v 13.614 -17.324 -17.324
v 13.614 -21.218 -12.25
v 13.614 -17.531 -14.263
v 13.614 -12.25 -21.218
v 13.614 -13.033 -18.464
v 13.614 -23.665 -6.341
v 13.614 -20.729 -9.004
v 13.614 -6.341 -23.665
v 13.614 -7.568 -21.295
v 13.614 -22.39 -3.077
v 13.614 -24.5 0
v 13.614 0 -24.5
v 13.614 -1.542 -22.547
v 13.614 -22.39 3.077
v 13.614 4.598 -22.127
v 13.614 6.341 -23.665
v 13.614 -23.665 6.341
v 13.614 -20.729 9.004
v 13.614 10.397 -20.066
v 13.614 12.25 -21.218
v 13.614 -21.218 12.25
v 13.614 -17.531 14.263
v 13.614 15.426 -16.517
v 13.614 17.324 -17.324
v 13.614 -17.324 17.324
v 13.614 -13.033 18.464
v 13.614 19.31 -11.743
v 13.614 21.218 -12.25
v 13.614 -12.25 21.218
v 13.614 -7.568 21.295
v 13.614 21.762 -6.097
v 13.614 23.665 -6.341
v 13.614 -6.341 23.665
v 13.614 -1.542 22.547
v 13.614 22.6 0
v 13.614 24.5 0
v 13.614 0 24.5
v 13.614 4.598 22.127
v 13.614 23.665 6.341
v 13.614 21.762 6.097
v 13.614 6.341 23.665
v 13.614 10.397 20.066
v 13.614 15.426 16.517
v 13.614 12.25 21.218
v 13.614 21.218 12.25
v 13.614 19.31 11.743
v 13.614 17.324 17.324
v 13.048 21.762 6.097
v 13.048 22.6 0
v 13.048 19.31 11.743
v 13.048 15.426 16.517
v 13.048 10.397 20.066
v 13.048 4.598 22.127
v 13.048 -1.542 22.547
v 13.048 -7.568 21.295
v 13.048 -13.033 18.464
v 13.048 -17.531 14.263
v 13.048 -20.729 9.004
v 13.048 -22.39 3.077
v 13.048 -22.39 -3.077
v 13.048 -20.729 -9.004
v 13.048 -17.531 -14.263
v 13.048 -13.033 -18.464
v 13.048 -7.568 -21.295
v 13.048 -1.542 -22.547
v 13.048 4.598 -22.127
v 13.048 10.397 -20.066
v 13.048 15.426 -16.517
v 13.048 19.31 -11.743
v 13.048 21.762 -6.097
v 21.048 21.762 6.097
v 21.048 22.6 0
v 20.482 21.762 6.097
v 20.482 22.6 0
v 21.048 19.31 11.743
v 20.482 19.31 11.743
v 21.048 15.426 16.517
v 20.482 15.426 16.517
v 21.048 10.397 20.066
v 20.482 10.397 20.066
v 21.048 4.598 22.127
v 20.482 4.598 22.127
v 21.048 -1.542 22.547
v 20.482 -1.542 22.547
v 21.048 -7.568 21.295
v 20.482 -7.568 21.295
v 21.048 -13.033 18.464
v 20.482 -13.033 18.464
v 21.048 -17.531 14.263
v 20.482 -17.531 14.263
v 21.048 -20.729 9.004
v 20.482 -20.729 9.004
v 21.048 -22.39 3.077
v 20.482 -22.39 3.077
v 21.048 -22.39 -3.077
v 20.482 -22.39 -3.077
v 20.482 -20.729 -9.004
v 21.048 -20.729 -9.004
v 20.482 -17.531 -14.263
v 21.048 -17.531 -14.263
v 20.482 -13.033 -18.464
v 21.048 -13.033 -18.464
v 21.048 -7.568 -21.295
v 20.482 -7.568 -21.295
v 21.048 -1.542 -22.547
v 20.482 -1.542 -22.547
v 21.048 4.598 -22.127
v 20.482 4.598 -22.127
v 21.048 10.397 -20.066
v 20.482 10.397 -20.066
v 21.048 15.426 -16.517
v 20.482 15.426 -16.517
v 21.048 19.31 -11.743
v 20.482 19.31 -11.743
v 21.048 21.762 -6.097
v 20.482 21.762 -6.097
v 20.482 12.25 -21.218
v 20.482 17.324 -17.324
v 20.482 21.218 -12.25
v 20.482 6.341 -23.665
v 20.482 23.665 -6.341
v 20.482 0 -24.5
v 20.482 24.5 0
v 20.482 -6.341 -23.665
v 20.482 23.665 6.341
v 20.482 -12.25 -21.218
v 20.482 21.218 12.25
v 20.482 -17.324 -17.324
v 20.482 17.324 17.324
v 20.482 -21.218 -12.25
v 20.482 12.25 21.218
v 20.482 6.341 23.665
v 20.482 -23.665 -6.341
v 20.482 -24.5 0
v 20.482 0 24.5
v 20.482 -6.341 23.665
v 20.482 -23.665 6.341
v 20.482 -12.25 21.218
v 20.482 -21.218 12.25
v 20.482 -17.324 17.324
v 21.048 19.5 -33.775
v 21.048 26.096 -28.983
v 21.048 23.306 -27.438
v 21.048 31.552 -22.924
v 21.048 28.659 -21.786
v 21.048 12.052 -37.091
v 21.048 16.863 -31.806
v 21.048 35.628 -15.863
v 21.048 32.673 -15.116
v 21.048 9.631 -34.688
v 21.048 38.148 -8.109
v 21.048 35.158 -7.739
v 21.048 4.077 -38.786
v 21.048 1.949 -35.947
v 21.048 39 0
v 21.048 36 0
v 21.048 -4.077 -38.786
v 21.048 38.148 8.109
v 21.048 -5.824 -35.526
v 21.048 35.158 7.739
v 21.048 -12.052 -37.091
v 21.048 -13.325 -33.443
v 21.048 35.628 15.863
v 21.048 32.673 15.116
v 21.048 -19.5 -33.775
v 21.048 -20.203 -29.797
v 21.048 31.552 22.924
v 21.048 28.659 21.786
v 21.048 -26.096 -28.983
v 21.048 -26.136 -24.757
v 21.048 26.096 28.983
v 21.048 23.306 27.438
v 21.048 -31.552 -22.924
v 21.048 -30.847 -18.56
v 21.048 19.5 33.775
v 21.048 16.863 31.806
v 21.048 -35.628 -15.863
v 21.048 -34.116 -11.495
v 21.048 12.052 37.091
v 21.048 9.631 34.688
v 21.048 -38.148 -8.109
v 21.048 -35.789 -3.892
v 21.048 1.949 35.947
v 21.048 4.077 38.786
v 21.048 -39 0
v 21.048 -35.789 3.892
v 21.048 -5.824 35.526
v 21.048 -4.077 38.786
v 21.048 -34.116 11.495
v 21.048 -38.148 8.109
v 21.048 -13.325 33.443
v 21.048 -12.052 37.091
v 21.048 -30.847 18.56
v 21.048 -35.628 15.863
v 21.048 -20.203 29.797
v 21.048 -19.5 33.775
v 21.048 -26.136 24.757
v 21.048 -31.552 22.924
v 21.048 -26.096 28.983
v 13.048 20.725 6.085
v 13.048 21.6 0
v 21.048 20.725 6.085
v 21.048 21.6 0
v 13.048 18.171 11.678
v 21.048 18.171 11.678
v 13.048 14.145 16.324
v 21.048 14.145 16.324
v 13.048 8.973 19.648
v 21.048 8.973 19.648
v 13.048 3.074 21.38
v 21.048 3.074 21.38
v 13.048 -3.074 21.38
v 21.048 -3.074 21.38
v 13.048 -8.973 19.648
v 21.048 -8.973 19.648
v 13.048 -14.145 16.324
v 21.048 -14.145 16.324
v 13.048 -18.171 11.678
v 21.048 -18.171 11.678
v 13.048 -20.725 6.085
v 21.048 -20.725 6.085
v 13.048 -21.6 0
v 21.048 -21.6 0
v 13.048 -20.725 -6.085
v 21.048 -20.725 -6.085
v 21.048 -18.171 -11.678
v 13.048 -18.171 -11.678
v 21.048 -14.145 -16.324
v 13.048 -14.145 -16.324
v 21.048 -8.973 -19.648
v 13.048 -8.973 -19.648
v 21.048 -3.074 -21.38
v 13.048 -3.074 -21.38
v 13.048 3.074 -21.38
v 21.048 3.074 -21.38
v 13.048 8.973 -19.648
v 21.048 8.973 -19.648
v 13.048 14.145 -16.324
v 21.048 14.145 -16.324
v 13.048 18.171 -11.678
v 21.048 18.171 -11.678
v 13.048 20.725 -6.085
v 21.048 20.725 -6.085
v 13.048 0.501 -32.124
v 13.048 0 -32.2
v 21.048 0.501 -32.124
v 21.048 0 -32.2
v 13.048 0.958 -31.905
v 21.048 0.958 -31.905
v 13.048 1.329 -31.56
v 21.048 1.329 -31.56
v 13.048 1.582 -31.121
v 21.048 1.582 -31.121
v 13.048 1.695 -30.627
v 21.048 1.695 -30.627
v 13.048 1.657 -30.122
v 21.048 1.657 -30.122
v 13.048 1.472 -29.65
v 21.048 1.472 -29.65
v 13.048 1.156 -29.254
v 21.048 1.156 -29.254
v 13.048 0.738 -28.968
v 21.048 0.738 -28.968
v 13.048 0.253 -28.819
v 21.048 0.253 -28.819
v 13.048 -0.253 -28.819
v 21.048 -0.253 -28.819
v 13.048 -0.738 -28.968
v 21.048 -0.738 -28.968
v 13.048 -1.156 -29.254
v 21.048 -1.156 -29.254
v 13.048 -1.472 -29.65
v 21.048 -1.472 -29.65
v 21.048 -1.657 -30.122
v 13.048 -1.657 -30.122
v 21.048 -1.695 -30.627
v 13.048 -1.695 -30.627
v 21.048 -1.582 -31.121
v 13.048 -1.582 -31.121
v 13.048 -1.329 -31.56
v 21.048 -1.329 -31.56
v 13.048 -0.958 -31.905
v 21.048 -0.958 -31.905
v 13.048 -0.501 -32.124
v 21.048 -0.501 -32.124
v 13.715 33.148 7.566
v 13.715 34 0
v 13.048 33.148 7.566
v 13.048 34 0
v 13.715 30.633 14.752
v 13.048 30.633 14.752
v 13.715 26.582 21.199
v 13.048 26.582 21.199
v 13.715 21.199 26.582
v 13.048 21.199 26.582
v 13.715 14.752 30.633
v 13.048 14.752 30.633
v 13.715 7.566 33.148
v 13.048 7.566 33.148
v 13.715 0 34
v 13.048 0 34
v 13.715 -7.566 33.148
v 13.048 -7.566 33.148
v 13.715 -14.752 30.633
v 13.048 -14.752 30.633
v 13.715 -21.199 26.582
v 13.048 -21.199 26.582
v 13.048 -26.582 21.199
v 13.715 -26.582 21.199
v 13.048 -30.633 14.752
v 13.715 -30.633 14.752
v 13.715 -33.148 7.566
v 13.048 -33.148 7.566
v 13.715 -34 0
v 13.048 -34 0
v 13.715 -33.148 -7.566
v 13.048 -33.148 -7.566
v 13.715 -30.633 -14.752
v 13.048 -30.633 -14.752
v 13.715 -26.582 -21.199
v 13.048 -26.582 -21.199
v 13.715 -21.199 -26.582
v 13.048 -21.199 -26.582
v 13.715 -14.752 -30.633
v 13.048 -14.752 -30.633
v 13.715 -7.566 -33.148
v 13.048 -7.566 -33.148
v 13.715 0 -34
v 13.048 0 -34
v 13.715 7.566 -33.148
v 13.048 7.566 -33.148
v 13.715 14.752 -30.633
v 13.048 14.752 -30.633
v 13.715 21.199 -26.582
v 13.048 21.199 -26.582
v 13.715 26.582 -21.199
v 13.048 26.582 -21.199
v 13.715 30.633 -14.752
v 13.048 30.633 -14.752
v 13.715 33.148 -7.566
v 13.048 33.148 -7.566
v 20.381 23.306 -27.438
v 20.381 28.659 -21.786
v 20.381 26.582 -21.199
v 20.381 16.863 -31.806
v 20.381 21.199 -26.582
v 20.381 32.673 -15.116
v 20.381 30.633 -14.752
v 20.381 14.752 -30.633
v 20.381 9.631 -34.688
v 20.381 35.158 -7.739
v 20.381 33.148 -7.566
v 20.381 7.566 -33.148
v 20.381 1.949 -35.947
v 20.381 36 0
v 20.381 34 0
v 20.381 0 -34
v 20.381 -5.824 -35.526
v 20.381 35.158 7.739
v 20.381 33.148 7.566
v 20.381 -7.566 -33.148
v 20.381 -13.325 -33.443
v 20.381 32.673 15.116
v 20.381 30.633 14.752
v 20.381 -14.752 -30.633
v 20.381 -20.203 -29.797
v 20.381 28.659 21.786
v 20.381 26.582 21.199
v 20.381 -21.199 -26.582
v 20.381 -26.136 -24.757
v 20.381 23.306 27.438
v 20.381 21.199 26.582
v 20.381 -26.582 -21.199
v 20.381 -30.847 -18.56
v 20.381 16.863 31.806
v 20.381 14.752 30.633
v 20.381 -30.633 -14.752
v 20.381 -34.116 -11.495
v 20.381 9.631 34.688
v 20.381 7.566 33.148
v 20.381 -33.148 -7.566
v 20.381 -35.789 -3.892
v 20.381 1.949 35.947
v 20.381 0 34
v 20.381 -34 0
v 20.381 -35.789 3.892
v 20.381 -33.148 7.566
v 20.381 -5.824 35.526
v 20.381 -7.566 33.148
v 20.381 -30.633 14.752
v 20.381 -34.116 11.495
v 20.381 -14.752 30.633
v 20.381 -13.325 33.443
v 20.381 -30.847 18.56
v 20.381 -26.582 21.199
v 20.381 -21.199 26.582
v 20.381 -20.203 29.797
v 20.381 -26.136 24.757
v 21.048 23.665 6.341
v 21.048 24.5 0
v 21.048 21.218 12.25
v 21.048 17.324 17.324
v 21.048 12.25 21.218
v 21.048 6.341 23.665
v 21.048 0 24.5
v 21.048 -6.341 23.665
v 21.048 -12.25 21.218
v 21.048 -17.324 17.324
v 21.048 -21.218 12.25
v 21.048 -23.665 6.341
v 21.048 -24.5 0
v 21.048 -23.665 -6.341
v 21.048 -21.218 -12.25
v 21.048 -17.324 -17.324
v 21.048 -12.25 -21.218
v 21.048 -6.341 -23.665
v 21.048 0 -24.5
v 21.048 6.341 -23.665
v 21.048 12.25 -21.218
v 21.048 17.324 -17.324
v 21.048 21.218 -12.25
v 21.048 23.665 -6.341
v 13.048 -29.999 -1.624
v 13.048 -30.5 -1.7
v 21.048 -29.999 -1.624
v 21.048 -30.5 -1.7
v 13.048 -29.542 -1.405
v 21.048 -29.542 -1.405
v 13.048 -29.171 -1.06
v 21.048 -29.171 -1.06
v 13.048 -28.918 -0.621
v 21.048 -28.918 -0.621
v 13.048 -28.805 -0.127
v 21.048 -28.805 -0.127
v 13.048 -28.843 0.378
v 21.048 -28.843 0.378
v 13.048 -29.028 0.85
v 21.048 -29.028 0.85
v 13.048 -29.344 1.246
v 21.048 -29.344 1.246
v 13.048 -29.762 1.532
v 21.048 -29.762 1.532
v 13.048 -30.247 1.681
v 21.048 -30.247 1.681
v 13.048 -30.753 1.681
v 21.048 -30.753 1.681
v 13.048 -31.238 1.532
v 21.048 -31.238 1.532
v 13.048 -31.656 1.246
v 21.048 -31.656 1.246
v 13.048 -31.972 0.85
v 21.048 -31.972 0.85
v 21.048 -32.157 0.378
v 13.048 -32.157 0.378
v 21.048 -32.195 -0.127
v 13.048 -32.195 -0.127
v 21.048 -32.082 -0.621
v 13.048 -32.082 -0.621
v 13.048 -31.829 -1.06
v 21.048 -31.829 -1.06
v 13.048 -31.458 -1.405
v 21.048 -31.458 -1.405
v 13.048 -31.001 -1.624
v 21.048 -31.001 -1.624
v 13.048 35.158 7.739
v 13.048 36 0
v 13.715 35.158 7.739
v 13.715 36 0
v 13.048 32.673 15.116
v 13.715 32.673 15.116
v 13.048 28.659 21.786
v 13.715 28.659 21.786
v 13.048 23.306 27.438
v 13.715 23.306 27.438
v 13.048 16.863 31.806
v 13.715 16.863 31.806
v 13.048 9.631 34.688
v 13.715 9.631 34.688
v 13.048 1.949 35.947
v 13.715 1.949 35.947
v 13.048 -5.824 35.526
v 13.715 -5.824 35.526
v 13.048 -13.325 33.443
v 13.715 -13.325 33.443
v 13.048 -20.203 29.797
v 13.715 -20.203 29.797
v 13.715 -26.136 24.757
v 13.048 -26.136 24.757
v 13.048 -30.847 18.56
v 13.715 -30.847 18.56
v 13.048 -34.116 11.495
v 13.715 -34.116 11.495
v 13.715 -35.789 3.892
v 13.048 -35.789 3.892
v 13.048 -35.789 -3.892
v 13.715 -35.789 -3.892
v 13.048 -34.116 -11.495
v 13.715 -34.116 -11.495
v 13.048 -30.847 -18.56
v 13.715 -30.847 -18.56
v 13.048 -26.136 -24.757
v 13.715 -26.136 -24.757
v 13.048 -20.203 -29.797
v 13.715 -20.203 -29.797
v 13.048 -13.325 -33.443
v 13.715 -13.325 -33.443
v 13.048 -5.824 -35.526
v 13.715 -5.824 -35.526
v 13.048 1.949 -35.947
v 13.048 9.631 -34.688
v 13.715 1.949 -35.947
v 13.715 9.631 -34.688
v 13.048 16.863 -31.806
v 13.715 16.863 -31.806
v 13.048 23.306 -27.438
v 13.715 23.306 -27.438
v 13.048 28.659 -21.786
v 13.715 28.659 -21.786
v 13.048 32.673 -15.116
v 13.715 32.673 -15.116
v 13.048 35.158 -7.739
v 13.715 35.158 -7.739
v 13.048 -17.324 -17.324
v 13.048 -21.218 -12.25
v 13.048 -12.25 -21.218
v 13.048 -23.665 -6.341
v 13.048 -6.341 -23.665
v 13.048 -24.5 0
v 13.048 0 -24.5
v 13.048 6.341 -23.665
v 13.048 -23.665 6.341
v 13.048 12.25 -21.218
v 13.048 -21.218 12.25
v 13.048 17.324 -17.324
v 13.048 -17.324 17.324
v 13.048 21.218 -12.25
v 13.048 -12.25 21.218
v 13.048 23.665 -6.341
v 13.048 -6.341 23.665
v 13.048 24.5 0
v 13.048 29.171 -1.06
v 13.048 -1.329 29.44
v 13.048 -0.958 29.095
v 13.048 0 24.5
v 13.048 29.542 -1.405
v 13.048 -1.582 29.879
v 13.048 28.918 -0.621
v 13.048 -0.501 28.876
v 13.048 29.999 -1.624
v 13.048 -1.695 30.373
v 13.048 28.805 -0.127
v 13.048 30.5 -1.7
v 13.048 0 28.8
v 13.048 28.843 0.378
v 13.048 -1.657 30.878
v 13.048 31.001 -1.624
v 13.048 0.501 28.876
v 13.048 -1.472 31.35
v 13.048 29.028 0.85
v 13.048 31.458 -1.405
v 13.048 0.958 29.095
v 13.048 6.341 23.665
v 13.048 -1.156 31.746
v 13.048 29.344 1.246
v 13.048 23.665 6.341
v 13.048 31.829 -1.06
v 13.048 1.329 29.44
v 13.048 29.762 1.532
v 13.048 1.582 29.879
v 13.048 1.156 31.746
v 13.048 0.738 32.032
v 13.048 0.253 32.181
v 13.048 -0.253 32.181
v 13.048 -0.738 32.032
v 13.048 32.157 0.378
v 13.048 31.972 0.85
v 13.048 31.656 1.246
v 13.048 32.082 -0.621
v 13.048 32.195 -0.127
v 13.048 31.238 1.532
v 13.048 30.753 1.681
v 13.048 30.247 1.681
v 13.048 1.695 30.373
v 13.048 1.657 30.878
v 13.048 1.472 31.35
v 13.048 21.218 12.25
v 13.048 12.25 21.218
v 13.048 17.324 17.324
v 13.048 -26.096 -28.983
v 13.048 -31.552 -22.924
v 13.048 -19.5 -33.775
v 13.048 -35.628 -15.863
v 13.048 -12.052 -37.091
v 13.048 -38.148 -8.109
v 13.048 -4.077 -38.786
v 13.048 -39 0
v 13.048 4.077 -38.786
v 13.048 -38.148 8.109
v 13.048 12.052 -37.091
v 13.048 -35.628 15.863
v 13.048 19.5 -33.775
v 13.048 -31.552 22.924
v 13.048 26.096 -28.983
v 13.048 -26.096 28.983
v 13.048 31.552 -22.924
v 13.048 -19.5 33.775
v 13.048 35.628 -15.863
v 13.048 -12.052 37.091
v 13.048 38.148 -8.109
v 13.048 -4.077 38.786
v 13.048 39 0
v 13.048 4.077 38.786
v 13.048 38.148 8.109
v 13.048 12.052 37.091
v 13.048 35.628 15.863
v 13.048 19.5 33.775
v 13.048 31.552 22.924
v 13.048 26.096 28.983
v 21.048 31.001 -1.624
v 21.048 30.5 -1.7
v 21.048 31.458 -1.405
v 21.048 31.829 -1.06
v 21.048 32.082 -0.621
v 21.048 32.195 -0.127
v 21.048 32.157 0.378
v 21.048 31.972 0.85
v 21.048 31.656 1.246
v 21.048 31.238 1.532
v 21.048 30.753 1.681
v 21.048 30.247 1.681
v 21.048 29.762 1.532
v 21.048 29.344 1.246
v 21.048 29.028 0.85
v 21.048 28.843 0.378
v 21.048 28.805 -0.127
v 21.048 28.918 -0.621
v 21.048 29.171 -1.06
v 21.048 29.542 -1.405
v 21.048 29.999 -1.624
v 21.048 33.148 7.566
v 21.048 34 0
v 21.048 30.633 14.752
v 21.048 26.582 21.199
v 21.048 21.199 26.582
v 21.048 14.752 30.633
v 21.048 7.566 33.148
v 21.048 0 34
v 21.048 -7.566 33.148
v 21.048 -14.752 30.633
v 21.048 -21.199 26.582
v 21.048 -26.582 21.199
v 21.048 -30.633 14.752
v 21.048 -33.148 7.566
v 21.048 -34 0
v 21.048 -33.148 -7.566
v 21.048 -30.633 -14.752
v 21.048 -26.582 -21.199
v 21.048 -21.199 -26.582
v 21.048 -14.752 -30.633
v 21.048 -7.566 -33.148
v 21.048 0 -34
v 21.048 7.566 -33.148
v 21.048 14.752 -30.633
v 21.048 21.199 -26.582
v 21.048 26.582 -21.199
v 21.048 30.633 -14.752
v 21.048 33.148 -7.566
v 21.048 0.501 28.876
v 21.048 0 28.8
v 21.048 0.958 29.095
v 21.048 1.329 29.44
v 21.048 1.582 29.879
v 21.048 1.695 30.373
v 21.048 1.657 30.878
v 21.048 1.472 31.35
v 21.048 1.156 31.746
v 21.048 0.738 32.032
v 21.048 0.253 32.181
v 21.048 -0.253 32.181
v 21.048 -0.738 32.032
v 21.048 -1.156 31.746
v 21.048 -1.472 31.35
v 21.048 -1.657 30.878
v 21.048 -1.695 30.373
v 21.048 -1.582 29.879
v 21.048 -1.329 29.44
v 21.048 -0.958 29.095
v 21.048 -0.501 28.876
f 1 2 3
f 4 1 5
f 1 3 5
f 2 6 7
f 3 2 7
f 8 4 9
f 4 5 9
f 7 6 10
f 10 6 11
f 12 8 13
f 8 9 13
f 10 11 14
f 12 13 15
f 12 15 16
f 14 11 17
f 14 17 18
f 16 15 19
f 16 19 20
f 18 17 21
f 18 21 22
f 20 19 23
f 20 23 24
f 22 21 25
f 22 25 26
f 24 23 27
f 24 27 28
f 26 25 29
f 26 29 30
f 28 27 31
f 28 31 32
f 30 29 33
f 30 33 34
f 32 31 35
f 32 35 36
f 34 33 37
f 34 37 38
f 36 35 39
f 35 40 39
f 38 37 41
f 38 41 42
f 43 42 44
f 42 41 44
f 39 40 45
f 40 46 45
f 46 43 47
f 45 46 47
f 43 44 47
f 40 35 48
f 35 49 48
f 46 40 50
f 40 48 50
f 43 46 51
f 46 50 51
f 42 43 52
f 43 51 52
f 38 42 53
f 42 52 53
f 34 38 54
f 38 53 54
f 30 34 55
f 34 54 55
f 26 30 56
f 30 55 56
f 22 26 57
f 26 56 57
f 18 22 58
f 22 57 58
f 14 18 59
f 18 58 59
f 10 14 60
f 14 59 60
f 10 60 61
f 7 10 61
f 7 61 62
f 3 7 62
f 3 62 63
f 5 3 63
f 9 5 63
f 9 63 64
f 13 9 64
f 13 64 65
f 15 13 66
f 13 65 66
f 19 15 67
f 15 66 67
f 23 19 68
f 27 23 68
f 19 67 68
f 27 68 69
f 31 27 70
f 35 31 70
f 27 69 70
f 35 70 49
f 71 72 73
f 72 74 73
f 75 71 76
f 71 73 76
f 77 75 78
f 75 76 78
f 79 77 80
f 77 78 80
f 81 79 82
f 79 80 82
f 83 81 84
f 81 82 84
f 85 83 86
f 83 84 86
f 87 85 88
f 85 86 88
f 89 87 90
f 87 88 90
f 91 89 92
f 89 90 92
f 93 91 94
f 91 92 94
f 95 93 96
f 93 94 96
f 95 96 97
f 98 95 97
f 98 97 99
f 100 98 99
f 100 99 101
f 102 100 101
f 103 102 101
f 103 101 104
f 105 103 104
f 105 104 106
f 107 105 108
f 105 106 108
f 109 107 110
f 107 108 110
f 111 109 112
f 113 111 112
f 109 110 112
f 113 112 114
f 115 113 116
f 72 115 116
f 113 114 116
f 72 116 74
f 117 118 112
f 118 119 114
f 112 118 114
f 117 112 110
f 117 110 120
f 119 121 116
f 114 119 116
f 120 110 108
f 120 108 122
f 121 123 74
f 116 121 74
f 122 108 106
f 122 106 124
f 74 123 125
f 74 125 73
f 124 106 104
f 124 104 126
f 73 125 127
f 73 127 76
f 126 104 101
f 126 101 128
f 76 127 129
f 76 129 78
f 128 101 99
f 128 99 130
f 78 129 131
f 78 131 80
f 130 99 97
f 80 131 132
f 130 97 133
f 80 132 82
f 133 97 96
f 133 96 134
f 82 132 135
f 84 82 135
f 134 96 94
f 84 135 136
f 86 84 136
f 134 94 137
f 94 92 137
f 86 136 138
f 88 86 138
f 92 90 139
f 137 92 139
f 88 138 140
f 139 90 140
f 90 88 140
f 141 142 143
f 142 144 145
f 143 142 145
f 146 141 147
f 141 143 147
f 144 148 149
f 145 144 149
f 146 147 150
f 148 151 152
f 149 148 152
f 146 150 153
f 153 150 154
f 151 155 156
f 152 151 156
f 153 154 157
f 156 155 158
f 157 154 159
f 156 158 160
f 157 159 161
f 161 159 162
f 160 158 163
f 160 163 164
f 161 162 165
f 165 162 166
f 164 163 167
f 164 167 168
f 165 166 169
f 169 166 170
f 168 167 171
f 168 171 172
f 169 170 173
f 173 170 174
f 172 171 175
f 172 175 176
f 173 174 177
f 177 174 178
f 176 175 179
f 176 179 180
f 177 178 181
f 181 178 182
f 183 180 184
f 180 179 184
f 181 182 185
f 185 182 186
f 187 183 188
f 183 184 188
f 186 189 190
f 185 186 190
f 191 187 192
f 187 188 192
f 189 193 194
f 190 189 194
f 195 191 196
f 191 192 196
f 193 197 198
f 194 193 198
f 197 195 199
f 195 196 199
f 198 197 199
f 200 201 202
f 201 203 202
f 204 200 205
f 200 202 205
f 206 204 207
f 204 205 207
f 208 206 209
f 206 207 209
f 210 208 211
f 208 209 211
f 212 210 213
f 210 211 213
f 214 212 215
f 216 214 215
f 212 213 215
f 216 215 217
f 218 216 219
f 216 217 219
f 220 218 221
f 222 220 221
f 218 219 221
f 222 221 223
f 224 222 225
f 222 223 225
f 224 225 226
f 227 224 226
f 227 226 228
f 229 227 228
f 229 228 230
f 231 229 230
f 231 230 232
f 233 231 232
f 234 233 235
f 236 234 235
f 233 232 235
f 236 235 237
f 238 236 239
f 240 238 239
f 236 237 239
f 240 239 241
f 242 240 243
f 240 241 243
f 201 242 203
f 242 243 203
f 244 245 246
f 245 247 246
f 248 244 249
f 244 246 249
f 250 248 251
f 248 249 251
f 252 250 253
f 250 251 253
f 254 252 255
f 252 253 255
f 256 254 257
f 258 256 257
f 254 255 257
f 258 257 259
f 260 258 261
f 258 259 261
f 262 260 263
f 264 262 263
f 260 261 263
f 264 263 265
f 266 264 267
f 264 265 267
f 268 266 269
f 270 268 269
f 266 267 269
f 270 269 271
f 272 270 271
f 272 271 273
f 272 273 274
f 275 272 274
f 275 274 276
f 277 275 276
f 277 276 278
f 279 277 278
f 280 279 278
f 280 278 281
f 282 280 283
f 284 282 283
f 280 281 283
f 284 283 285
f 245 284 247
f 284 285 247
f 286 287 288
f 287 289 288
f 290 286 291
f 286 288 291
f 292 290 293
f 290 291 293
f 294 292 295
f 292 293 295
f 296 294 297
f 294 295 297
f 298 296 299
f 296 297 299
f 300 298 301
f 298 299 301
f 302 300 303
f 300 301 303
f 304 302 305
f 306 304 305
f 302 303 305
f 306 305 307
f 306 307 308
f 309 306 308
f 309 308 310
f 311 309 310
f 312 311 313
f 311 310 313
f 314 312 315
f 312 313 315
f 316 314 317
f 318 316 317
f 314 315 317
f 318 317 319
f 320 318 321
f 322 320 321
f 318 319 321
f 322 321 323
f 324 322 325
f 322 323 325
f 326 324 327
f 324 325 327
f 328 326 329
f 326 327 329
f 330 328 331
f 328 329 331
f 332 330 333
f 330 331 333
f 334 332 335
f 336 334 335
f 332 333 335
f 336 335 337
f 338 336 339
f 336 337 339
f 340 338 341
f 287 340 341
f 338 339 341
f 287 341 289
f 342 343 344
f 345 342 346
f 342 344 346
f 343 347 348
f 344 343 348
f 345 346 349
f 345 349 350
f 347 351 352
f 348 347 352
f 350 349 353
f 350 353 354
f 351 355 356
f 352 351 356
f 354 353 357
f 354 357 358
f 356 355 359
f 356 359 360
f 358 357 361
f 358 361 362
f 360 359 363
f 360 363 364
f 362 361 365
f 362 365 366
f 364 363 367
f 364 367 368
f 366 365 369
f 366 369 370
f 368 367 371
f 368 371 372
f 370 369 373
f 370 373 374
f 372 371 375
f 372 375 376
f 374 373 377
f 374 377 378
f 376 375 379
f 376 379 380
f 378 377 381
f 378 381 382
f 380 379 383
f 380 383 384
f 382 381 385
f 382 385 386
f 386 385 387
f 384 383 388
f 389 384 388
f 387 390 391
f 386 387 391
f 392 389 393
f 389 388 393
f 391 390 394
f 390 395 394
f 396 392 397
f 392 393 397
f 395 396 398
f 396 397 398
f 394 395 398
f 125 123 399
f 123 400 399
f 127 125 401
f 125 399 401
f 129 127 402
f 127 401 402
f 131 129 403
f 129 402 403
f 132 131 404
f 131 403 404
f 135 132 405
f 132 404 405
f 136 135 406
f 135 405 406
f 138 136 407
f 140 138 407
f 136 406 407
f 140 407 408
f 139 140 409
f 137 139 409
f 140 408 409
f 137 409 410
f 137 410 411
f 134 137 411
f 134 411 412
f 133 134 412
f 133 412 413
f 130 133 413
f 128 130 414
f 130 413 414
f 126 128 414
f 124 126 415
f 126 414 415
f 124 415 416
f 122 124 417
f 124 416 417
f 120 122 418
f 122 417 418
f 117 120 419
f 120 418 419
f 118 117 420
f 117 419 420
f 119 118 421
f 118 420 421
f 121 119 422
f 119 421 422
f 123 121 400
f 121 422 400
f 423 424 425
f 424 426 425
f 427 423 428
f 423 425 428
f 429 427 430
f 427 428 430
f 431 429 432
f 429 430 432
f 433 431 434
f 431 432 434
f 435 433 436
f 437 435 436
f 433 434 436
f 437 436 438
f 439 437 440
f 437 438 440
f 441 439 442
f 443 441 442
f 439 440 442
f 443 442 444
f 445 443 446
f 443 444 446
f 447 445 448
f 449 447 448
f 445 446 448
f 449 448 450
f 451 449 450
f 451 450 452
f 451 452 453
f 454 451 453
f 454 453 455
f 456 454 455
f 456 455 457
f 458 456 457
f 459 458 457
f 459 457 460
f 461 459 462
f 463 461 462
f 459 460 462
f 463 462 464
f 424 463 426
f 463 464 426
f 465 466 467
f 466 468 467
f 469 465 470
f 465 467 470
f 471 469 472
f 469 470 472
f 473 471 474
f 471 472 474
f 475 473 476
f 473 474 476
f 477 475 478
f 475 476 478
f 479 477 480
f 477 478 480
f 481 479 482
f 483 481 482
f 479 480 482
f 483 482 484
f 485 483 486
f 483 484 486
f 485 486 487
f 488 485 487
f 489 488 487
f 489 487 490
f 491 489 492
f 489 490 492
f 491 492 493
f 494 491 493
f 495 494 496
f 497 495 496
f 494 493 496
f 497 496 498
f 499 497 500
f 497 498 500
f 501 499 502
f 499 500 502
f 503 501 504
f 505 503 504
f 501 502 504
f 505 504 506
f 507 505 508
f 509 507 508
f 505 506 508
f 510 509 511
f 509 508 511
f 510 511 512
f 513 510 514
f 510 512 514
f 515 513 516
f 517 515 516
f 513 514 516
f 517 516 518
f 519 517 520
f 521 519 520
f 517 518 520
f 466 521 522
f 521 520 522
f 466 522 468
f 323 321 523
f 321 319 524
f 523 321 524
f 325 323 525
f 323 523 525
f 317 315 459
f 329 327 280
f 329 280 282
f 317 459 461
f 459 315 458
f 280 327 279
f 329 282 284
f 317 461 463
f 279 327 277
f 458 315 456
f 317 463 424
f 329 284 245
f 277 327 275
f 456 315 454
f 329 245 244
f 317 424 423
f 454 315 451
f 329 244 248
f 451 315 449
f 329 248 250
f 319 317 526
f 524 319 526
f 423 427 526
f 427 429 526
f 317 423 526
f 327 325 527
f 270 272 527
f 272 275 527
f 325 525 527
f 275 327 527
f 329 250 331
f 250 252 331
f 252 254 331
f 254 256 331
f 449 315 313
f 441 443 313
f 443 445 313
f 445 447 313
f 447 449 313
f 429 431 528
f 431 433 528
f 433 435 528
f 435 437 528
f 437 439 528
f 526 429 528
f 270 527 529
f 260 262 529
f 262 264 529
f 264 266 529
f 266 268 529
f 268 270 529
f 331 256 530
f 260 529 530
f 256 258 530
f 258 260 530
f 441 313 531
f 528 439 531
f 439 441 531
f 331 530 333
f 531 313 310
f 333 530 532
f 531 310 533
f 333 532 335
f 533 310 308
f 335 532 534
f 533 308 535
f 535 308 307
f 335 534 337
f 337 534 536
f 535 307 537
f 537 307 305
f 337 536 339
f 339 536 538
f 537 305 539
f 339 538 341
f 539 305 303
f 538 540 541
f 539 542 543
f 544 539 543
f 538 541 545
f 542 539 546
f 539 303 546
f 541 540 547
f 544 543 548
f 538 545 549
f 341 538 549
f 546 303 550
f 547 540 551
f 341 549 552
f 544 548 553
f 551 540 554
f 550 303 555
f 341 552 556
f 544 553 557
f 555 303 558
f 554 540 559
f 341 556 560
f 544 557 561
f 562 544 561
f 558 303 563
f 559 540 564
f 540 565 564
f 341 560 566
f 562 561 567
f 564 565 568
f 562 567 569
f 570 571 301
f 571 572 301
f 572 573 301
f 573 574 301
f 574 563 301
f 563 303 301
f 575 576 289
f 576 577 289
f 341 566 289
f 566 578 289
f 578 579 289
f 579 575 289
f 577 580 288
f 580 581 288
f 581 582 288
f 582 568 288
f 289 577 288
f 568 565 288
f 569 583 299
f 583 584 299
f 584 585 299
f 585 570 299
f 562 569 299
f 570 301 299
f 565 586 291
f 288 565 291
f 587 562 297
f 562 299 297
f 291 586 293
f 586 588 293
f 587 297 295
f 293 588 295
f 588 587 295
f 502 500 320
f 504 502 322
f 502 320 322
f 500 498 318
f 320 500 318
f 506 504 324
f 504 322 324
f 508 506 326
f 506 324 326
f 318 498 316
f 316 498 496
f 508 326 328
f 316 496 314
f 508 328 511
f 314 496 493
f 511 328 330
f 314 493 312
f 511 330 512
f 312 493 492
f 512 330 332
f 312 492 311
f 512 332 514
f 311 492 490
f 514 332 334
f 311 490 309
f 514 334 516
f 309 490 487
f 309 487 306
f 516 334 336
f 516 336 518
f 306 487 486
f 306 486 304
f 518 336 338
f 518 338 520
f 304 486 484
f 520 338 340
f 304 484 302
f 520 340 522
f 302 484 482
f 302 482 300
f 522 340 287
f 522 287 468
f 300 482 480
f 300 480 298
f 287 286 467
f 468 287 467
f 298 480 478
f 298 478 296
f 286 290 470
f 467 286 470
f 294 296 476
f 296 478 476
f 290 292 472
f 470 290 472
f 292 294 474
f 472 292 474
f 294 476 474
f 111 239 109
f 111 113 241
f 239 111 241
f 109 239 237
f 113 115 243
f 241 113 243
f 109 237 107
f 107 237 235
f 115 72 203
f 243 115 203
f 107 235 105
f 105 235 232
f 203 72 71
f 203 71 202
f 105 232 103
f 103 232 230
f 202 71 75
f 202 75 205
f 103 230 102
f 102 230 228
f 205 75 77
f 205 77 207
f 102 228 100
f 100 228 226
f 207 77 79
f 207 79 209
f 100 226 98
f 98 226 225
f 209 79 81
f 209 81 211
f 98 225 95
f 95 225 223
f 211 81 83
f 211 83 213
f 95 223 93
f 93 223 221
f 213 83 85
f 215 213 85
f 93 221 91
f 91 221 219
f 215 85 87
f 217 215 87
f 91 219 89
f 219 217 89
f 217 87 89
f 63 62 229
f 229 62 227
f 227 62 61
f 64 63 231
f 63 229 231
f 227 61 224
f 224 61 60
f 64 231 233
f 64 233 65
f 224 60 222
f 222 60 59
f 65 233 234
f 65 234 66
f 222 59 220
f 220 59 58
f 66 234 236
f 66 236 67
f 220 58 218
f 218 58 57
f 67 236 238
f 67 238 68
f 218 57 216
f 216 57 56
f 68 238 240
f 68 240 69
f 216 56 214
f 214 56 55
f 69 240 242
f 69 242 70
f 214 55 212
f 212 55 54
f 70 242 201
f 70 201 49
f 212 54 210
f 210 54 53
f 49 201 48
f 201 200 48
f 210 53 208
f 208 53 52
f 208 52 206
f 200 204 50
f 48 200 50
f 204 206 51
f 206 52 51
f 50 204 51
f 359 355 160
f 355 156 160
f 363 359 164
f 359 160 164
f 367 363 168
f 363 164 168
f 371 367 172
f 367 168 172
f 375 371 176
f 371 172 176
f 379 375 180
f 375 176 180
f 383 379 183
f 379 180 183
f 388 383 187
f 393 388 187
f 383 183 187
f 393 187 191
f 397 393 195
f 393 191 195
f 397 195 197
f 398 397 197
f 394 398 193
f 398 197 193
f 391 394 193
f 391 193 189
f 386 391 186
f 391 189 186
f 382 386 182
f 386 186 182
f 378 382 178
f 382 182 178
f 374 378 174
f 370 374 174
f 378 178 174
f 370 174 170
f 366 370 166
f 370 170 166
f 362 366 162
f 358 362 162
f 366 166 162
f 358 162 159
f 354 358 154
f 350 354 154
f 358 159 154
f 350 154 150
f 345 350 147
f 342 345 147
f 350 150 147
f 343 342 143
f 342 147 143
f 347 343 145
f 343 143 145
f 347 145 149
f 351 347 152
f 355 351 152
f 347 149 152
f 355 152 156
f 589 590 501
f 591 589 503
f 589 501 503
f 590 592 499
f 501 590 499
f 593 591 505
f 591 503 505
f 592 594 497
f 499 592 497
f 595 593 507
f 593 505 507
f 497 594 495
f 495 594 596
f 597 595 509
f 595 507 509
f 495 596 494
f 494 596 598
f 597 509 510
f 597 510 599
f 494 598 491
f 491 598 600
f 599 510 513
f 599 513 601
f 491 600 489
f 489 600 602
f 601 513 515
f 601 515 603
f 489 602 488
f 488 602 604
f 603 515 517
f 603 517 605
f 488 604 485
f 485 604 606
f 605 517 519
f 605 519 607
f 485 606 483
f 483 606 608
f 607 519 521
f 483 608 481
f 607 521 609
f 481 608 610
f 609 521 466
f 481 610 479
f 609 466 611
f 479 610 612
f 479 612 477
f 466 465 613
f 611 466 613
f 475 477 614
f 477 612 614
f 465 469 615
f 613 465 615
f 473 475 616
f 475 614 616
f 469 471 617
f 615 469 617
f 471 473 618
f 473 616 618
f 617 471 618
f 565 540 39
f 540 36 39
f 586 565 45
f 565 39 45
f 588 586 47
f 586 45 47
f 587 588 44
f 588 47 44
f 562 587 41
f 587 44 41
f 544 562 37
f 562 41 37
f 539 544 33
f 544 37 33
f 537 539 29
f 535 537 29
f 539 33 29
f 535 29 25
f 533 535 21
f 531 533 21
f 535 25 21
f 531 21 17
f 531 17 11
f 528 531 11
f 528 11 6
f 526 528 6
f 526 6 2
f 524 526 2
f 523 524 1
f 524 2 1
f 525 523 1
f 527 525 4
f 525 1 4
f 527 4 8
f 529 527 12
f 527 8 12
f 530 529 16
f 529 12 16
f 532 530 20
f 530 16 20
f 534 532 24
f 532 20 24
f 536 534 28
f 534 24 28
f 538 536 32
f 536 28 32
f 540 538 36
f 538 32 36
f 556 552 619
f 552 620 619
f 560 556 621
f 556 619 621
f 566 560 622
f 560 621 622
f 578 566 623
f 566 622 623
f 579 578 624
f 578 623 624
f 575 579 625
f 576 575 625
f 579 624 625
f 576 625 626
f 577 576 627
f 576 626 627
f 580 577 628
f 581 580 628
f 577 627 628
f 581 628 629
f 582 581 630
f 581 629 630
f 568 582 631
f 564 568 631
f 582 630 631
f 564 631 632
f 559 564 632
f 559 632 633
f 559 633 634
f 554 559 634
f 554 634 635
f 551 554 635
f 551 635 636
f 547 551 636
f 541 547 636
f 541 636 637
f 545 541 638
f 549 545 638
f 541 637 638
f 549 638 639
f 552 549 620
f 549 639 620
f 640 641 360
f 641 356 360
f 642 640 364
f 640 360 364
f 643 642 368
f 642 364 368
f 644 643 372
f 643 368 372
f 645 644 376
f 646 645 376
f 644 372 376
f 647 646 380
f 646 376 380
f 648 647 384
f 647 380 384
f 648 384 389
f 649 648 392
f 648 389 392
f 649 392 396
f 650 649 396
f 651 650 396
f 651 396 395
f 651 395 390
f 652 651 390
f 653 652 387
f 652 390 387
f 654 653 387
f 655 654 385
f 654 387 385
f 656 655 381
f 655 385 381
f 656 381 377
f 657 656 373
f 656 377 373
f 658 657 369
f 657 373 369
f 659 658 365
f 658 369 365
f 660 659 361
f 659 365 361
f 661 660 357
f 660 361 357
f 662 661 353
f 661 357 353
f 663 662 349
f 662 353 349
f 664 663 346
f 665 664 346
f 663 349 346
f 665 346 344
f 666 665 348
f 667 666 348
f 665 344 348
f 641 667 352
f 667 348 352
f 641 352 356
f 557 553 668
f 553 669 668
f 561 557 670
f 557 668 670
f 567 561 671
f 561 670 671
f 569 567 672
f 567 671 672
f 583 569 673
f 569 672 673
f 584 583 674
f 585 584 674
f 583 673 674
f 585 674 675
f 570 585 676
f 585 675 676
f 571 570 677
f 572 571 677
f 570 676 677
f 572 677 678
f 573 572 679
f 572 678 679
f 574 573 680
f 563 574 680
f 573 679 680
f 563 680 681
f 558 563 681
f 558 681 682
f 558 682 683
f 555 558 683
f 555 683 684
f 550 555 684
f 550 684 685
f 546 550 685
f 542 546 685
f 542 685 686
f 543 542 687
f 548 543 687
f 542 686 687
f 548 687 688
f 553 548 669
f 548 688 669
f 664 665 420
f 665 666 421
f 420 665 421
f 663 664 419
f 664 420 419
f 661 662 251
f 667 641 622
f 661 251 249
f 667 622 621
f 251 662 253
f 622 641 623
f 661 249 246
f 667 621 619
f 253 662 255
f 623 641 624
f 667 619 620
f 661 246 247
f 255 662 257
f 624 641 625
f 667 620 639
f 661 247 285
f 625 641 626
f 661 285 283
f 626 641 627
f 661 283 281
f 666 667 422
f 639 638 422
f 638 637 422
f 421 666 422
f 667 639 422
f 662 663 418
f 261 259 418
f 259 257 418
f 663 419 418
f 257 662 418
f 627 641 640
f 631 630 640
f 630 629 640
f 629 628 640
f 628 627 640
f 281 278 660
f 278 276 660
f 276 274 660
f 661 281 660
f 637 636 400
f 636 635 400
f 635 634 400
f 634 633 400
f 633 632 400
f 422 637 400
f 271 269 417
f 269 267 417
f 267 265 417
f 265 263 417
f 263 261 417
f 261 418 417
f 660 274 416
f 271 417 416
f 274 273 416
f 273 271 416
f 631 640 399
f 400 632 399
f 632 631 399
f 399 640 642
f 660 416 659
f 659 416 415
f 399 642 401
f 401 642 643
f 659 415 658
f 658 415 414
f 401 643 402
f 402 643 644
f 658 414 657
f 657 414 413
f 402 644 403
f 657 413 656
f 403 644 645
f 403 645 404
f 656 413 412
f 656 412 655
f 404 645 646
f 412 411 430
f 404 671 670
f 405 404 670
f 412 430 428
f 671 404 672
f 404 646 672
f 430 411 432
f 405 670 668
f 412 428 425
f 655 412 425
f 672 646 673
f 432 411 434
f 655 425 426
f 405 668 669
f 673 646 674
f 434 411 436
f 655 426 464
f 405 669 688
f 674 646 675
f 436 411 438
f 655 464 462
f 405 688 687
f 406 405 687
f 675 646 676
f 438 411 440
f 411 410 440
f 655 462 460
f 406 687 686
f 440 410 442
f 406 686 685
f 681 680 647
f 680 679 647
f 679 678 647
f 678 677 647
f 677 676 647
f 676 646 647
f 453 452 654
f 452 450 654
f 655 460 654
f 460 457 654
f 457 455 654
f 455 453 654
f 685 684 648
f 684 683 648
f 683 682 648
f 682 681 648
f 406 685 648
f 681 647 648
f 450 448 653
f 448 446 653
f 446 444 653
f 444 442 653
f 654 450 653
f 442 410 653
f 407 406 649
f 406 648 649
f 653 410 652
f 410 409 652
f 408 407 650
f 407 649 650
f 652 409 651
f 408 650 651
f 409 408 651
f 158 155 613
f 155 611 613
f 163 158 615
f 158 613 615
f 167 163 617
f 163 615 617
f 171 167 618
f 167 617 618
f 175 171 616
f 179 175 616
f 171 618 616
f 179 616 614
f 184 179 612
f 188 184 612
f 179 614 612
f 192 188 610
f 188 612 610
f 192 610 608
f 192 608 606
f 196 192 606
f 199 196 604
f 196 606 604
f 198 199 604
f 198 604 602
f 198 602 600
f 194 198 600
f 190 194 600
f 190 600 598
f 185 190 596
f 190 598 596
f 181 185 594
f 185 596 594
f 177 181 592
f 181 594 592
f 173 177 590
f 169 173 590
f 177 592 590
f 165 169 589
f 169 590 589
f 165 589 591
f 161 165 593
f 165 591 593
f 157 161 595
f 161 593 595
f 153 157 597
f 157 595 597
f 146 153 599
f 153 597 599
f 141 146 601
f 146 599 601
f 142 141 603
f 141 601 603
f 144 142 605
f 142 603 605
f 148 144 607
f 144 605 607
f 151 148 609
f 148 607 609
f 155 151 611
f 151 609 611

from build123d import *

# Parameters (mm, degrees)
M3_CLEARANCE_HOLE1_D     = 3.4
M3_CLEARANCE_HOLE1_DEPTH = 8
M3_CLEARANCE_HOLE1_TIP   = 1.021463052


with BuildPart() as part:
    # Sketch1 → Revolve17 (revolve)
    with BuildSketch(Plane.XY):
        Polygon((20.481671209, 24.5), (21.047671209, 24.5), (21.047671209, 34), (20.380671209, 34), (20.380671209, 36), (21.047671209, 36), (21.047671209, 39), (13.047671209, 39), (13.047671209, 36), (13.714671209, 36), (13.714671209, 34), (13.047671209, 34), (13.047671209, 24.5), (13.613671209, 24.5), (13.613671209, 22.6), (13.047671209, 22.6), (13.047671209, 21.6), (21.047671209, 21.6), (21.047671209, 22.6), (20.481671209, 22.6), align=None)
    revolve(axis=Axis((-801.920554309, 0, 0), (1, 0, 0)))

    # M3 Clearance Hole1
    with Locations(Plane.ZY.offset(-13.047671209)):
        with Locations((0, -30.5), (0, 30.5), (30.5, 0), (-30.5, 0)):
            Hole(M3_CLEARANCE_HOLE1_D / 2, depth=M3_CLEARANCE_HOLE1_DEPTH)
            with Locations((0, 0, -(M3_CLEARANCE_HOLE1_DEPTH + M3_CLEARANCE_HOLE1_TIP / 2))):  # 118° drill point
                Cone(0, M3_CLEARANCE_HOLE1_D / 2, M3_CLEARANCE_HOLE1_TIP, mode=Mode.SUBTRACT)


solid = part.part
